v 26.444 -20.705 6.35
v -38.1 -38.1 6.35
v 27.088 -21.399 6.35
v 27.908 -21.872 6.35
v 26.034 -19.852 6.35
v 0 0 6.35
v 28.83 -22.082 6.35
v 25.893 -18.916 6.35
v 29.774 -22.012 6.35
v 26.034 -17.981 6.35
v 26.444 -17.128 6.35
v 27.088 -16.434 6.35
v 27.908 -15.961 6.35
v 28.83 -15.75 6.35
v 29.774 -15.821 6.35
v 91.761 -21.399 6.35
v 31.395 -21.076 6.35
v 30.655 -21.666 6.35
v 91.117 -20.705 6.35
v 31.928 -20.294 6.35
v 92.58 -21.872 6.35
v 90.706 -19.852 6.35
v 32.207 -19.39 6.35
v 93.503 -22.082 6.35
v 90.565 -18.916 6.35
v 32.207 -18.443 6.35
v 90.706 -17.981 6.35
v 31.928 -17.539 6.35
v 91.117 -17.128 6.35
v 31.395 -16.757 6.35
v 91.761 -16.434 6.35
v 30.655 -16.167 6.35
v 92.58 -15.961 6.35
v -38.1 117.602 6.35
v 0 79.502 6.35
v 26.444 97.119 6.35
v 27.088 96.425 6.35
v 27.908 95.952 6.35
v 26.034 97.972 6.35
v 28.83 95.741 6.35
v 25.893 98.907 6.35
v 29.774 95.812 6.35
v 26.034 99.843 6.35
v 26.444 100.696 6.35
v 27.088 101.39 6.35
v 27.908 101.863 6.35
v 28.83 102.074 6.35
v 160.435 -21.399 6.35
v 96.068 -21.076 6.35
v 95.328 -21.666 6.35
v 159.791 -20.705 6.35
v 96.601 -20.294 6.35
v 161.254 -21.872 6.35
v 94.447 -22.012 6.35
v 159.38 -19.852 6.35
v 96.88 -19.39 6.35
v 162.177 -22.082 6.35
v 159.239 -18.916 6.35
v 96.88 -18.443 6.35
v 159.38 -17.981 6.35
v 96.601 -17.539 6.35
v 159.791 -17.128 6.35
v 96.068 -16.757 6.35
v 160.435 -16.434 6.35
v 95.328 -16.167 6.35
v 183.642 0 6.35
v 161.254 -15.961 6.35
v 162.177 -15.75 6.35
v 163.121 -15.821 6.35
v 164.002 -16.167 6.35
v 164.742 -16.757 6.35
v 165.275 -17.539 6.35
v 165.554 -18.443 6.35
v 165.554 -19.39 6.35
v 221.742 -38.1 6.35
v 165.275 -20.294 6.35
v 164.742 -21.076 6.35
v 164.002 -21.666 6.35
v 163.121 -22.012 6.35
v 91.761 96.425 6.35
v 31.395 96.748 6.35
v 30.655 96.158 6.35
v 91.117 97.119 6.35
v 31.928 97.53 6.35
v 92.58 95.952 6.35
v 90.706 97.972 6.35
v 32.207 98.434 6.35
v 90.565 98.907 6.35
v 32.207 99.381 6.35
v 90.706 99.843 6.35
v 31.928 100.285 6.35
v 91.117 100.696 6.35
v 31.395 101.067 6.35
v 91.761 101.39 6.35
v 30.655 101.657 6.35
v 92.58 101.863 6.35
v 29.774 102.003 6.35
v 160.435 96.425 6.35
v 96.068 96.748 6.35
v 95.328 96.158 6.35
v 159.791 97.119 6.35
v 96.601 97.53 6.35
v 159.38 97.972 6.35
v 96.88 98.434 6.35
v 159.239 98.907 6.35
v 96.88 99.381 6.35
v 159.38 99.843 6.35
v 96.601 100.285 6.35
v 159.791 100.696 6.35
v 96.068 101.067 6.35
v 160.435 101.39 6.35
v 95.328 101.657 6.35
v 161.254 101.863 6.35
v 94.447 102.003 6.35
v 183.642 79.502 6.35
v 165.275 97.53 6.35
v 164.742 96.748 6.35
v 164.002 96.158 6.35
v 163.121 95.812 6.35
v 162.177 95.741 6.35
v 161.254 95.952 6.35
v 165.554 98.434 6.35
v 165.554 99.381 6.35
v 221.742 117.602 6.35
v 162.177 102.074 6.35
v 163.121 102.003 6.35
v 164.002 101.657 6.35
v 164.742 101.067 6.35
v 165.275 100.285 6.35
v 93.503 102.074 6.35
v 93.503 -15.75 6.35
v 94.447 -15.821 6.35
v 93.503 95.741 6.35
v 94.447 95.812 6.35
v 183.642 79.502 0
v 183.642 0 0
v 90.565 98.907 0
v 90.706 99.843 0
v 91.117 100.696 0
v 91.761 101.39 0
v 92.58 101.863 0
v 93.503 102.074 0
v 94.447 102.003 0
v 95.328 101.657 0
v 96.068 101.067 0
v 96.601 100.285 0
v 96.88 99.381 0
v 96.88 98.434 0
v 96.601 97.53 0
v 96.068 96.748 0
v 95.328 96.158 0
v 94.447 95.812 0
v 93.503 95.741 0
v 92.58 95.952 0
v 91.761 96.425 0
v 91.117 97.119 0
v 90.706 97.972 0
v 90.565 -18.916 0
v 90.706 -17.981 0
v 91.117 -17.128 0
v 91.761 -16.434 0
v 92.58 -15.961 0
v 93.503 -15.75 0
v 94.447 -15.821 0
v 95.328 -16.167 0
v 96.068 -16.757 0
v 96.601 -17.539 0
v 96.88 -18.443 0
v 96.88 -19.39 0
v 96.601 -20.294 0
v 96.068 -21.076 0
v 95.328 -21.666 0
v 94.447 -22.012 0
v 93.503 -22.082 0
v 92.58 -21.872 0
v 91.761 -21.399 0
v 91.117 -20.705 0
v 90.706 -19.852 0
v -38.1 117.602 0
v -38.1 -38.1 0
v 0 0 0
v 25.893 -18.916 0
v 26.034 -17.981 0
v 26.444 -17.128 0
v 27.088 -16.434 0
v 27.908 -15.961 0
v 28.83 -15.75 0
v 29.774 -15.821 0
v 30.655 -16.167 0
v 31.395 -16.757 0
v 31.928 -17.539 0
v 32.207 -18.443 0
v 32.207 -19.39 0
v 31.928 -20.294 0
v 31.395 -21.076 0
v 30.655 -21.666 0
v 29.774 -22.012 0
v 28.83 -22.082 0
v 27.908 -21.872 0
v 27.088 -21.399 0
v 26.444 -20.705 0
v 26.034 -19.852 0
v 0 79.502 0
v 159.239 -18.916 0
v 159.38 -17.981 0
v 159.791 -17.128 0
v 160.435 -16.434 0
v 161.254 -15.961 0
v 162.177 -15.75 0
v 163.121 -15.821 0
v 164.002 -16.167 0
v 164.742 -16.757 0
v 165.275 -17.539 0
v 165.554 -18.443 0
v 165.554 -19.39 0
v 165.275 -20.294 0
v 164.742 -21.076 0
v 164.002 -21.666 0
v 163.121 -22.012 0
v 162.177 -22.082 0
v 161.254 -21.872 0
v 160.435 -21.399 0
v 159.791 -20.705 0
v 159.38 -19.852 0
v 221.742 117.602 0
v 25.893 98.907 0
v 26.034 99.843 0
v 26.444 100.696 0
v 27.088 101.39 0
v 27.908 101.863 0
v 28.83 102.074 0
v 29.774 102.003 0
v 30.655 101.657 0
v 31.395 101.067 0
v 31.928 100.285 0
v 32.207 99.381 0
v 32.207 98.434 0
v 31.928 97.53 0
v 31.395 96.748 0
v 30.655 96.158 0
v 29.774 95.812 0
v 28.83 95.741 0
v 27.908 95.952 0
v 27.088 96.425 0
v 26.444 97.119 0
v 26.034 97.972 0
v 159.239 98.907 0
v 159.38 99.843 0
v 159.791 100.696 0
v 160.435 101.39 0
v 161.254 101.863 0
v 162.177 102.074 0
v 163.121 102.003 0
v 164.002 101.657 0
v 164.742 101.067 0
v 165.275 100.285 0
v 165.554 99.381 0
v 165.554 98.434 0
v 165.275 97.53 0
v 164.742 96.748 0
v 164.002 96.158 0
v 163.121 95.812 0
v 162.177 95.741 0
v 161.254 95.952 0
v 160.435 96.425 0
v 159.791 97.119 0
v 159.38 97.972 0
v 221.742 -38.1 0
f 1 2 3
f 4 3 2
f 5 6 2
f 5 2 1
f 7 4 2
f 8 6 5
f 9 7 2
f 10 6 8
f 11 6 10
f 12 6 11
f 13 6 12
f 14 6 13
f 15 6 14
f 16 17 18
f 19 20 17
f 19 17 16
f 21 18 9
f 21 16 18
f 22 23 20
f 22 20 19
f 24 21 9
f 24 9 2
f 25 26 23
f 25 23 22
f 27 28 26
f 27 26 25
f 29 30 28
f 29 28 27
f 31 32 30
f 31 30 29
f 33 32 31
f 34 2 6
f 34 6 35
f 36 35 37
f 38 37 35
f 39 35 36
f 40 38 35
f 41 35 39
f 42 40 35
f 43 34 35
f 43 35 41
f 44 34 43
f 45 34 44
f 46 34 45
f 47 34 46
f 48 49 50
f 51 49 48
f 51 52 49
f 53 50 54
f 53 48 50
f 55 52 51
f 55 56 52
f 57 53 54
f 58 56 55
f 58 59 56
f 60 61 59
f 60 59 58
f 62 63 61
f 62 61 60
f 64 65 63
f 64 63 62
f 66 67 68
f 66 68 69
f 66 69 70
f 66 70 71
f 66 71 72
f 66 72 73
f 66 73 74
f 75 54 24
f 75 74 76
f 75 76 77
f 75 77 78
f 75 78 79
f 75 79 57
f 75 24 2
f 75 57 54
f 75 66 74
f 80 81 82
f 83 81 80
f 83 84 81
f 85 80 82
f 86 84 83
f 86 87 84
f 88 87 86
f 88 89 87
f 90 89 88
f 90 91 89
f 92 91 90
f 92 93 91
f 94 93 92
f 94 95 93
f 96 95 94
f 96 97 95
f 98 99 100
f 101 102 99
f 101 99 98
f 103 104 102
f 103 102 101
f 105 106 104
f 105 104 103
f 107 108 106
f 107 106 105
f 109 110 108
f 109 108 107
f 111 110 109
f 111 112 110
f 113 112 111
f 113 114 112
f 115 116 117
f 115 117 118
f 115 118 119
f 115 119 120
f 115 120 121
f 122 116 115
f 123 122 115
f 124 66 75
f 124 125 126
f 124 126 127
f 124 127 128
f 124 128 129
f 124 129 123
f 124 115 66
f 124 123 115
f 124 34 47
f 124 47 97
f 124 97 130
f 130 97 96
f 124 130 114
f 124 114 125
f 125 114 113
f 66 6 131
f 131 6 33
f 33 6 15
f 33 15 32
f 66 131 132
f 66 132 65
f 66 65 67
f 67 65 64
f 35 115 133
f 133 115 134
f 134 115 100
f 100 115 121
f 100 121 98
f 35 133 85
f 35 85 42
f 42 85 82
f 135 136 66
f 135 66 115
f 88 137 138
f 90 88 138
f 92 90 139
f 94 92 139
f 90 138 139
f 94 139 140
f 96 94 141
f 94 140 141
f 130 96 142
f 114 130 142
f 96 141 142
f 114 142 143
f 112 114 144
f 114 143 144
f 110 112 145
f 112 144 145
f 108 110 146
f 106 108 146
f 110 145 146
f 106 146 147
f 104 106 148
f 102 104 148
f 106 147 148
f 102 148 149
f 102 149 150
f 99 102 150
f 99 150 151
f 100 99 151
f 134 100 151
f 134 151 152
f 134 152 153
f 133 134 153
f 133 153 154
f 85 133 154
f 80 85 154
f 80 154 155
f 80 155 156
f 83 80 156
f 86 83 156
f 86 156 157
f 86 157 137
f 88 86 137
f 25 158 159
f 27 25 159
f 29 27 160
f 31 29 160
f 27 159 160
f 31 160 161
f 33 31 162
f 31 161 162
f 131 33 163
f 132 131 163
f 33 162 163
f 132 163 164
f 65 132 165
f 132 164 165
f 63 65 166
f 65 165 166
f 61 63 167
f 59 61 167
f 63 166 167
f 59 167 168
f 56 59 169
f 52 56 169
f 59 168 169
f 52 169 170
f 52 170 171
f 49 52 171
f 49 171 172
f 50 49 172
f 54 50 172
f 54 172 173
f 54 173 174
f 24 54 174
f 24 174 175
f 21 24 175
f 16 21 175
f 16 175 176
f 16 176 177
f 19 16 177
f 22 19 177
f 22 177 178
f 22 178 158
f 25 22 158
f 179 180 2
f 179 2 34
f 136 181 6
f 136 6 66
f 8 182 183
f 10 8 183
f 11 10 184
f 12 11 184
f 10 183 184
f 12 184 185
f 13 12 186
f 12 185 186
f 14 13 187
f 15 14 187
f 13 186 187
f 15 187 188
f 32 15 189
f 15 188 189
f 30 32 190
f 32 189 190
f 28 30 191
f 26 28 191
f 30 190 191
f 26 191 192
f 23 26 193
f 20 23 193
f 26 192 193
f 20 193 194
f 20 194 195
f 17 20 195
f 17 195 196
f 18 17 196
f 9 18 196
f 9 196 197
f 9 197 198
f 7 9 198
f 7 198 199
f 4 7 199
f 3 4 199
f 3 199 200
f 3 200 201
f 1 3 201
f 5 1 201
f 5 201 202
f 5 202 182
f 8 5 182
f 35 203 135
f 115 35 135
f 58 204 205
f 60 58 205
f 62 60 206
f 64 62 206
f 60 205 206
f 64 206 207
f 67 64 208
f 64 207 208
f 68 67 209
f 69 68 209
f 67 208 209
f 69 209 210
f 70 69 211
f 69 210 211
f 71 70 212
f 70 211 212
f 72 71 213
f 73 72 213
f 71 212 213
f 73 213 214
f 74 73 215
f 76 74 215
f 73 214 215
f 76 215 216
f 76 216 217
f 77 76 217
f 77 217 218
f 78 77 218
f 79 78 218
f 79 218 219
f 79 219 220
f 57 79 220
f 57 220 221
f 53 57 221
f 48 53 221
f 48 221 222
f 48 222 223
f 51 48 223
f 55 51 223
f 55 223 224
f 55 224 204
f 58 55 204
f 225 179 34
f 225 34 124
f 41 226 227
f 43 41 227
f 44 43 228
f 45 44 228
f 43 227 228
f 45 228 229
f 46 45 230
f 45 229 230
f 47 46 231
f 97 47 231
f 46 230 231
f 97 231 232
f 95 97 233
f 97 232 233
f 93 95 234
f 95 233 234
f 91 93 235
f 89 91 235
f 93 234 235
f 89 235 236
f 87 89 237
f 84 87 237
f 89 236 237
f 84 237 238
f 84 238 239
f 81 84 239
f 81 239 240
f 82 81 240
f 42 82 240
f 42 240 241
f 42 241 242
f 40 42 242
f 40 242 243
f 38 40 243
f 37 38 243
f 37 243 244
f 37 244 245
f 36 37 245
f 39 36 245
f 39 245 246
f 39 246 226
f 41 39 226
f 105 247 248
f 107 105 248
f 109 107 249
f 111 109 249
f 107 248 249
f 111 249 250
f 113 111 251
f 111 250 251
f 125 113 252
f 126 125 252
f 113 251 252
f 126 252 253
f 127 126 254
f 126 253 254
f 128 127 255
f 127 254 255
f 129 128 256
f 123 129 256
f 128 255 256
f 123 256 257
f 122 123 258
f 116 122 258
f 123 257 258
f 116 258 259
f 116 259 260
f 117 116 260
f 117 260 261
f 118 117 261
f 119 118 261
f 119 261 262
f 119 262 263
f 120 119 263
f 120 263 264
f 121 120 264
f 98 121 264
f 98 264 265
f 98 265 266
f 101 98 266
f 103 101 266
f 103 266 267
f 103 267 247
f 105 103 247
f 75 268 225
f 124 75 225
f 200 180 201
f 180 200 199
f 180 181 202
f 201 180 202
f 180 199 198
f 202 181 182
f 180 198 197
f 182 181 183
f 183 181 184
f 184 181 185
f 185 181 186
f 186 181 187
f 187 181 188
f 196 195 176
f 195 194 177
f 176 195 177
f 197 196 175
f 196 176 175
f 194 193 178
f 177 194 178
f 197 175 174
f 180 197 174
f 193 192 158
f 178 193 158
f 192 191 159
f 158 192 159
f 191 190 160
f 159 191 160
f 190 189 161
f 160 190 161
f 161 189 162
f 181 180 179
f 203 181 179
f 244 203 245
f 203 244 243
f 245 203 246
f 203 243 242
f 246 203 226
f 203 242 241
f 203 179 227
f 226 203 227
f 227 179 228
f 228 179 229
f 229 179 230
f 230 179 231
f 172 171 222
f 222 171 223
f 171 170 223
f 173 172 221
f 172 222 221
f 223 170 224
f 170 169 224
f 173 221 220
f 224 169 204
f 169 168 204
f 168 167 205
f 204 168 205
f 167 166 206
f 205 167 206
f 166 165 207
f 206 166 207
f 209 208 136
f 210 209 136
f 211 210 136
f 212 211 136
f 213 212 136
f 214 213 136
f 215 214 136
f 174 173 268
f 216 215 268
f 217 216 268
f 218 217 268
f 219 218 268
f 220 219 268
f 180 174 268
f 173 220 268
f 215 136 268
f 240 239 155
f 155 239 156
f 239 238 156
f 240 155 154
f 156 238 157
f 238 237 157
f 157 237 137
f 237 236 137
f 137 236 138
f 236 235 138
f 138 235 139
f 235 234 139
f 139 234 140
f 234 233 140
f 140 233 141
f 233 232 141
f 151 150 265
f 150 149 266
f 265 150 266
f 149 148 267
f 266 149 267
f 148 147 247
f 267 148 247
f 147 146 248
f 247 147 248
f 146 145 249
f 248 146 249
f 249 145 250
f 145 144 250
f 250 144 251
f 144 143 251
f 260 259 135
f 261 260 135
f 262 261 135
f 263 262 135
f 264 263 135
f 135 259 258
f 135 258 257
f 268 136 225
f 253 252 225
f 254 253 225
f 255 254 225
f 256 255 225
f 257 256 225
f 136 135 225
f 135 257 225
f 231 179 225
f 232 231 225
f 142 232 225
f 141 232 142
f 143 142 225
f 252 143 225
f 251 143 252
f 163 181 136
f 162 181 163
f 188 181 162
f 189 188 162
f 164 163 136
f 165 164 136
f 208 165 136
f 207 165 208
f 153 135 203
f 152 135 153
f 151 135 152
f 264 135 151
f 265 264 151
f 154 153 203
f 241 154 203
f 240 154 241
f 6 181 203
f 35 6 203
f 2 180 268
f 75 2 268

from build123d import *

# Parameters (mm, degrees)
SKETCH1_W                   = 259.842
SKETCH1_H                   = 155.702
SKETCH1_W_2                 = 183.642
SKETCH1_H_2                 = 79.502
BOSS_EXTRUDE1_DEPTH         = 6.35
F_1_4_0_25_DIAMETER_SLOT1_D = 6.35


with BuildPart() as part:
    # Sketch1 → Boss-Extrude1 (new body)
    with BuildSketch(Plane.XY):
        with Locations((91.821, 39.751)):
            Rectangle(SKETCH1_W, SKETCH1_H)
        with Locations((91.821, 39.751)):
            Rectangle(SKETCH1_W_2, SKETCH1_H_2, mode=Mode.SUBTRACT)
    extrude(amount=BOSS_EXTRUDE1_DEPTH)

    # 1/4 (0.25) Diameter Slot1 (through all)
    with Locations(Plane.XY.offset(6.35)):
        with Locations((29.067540373, 98.907455137), (93.740319595, 98.907455137), (162.414380138, 98.907455137), (162.414380138, -18.916352314), (93.740319595, -18.916352314), (29.067540373, -18.916352314)):
            Hole(F_1_4_0_25_DIAMETER_SLOT1_D / 2)


solid = part.part
